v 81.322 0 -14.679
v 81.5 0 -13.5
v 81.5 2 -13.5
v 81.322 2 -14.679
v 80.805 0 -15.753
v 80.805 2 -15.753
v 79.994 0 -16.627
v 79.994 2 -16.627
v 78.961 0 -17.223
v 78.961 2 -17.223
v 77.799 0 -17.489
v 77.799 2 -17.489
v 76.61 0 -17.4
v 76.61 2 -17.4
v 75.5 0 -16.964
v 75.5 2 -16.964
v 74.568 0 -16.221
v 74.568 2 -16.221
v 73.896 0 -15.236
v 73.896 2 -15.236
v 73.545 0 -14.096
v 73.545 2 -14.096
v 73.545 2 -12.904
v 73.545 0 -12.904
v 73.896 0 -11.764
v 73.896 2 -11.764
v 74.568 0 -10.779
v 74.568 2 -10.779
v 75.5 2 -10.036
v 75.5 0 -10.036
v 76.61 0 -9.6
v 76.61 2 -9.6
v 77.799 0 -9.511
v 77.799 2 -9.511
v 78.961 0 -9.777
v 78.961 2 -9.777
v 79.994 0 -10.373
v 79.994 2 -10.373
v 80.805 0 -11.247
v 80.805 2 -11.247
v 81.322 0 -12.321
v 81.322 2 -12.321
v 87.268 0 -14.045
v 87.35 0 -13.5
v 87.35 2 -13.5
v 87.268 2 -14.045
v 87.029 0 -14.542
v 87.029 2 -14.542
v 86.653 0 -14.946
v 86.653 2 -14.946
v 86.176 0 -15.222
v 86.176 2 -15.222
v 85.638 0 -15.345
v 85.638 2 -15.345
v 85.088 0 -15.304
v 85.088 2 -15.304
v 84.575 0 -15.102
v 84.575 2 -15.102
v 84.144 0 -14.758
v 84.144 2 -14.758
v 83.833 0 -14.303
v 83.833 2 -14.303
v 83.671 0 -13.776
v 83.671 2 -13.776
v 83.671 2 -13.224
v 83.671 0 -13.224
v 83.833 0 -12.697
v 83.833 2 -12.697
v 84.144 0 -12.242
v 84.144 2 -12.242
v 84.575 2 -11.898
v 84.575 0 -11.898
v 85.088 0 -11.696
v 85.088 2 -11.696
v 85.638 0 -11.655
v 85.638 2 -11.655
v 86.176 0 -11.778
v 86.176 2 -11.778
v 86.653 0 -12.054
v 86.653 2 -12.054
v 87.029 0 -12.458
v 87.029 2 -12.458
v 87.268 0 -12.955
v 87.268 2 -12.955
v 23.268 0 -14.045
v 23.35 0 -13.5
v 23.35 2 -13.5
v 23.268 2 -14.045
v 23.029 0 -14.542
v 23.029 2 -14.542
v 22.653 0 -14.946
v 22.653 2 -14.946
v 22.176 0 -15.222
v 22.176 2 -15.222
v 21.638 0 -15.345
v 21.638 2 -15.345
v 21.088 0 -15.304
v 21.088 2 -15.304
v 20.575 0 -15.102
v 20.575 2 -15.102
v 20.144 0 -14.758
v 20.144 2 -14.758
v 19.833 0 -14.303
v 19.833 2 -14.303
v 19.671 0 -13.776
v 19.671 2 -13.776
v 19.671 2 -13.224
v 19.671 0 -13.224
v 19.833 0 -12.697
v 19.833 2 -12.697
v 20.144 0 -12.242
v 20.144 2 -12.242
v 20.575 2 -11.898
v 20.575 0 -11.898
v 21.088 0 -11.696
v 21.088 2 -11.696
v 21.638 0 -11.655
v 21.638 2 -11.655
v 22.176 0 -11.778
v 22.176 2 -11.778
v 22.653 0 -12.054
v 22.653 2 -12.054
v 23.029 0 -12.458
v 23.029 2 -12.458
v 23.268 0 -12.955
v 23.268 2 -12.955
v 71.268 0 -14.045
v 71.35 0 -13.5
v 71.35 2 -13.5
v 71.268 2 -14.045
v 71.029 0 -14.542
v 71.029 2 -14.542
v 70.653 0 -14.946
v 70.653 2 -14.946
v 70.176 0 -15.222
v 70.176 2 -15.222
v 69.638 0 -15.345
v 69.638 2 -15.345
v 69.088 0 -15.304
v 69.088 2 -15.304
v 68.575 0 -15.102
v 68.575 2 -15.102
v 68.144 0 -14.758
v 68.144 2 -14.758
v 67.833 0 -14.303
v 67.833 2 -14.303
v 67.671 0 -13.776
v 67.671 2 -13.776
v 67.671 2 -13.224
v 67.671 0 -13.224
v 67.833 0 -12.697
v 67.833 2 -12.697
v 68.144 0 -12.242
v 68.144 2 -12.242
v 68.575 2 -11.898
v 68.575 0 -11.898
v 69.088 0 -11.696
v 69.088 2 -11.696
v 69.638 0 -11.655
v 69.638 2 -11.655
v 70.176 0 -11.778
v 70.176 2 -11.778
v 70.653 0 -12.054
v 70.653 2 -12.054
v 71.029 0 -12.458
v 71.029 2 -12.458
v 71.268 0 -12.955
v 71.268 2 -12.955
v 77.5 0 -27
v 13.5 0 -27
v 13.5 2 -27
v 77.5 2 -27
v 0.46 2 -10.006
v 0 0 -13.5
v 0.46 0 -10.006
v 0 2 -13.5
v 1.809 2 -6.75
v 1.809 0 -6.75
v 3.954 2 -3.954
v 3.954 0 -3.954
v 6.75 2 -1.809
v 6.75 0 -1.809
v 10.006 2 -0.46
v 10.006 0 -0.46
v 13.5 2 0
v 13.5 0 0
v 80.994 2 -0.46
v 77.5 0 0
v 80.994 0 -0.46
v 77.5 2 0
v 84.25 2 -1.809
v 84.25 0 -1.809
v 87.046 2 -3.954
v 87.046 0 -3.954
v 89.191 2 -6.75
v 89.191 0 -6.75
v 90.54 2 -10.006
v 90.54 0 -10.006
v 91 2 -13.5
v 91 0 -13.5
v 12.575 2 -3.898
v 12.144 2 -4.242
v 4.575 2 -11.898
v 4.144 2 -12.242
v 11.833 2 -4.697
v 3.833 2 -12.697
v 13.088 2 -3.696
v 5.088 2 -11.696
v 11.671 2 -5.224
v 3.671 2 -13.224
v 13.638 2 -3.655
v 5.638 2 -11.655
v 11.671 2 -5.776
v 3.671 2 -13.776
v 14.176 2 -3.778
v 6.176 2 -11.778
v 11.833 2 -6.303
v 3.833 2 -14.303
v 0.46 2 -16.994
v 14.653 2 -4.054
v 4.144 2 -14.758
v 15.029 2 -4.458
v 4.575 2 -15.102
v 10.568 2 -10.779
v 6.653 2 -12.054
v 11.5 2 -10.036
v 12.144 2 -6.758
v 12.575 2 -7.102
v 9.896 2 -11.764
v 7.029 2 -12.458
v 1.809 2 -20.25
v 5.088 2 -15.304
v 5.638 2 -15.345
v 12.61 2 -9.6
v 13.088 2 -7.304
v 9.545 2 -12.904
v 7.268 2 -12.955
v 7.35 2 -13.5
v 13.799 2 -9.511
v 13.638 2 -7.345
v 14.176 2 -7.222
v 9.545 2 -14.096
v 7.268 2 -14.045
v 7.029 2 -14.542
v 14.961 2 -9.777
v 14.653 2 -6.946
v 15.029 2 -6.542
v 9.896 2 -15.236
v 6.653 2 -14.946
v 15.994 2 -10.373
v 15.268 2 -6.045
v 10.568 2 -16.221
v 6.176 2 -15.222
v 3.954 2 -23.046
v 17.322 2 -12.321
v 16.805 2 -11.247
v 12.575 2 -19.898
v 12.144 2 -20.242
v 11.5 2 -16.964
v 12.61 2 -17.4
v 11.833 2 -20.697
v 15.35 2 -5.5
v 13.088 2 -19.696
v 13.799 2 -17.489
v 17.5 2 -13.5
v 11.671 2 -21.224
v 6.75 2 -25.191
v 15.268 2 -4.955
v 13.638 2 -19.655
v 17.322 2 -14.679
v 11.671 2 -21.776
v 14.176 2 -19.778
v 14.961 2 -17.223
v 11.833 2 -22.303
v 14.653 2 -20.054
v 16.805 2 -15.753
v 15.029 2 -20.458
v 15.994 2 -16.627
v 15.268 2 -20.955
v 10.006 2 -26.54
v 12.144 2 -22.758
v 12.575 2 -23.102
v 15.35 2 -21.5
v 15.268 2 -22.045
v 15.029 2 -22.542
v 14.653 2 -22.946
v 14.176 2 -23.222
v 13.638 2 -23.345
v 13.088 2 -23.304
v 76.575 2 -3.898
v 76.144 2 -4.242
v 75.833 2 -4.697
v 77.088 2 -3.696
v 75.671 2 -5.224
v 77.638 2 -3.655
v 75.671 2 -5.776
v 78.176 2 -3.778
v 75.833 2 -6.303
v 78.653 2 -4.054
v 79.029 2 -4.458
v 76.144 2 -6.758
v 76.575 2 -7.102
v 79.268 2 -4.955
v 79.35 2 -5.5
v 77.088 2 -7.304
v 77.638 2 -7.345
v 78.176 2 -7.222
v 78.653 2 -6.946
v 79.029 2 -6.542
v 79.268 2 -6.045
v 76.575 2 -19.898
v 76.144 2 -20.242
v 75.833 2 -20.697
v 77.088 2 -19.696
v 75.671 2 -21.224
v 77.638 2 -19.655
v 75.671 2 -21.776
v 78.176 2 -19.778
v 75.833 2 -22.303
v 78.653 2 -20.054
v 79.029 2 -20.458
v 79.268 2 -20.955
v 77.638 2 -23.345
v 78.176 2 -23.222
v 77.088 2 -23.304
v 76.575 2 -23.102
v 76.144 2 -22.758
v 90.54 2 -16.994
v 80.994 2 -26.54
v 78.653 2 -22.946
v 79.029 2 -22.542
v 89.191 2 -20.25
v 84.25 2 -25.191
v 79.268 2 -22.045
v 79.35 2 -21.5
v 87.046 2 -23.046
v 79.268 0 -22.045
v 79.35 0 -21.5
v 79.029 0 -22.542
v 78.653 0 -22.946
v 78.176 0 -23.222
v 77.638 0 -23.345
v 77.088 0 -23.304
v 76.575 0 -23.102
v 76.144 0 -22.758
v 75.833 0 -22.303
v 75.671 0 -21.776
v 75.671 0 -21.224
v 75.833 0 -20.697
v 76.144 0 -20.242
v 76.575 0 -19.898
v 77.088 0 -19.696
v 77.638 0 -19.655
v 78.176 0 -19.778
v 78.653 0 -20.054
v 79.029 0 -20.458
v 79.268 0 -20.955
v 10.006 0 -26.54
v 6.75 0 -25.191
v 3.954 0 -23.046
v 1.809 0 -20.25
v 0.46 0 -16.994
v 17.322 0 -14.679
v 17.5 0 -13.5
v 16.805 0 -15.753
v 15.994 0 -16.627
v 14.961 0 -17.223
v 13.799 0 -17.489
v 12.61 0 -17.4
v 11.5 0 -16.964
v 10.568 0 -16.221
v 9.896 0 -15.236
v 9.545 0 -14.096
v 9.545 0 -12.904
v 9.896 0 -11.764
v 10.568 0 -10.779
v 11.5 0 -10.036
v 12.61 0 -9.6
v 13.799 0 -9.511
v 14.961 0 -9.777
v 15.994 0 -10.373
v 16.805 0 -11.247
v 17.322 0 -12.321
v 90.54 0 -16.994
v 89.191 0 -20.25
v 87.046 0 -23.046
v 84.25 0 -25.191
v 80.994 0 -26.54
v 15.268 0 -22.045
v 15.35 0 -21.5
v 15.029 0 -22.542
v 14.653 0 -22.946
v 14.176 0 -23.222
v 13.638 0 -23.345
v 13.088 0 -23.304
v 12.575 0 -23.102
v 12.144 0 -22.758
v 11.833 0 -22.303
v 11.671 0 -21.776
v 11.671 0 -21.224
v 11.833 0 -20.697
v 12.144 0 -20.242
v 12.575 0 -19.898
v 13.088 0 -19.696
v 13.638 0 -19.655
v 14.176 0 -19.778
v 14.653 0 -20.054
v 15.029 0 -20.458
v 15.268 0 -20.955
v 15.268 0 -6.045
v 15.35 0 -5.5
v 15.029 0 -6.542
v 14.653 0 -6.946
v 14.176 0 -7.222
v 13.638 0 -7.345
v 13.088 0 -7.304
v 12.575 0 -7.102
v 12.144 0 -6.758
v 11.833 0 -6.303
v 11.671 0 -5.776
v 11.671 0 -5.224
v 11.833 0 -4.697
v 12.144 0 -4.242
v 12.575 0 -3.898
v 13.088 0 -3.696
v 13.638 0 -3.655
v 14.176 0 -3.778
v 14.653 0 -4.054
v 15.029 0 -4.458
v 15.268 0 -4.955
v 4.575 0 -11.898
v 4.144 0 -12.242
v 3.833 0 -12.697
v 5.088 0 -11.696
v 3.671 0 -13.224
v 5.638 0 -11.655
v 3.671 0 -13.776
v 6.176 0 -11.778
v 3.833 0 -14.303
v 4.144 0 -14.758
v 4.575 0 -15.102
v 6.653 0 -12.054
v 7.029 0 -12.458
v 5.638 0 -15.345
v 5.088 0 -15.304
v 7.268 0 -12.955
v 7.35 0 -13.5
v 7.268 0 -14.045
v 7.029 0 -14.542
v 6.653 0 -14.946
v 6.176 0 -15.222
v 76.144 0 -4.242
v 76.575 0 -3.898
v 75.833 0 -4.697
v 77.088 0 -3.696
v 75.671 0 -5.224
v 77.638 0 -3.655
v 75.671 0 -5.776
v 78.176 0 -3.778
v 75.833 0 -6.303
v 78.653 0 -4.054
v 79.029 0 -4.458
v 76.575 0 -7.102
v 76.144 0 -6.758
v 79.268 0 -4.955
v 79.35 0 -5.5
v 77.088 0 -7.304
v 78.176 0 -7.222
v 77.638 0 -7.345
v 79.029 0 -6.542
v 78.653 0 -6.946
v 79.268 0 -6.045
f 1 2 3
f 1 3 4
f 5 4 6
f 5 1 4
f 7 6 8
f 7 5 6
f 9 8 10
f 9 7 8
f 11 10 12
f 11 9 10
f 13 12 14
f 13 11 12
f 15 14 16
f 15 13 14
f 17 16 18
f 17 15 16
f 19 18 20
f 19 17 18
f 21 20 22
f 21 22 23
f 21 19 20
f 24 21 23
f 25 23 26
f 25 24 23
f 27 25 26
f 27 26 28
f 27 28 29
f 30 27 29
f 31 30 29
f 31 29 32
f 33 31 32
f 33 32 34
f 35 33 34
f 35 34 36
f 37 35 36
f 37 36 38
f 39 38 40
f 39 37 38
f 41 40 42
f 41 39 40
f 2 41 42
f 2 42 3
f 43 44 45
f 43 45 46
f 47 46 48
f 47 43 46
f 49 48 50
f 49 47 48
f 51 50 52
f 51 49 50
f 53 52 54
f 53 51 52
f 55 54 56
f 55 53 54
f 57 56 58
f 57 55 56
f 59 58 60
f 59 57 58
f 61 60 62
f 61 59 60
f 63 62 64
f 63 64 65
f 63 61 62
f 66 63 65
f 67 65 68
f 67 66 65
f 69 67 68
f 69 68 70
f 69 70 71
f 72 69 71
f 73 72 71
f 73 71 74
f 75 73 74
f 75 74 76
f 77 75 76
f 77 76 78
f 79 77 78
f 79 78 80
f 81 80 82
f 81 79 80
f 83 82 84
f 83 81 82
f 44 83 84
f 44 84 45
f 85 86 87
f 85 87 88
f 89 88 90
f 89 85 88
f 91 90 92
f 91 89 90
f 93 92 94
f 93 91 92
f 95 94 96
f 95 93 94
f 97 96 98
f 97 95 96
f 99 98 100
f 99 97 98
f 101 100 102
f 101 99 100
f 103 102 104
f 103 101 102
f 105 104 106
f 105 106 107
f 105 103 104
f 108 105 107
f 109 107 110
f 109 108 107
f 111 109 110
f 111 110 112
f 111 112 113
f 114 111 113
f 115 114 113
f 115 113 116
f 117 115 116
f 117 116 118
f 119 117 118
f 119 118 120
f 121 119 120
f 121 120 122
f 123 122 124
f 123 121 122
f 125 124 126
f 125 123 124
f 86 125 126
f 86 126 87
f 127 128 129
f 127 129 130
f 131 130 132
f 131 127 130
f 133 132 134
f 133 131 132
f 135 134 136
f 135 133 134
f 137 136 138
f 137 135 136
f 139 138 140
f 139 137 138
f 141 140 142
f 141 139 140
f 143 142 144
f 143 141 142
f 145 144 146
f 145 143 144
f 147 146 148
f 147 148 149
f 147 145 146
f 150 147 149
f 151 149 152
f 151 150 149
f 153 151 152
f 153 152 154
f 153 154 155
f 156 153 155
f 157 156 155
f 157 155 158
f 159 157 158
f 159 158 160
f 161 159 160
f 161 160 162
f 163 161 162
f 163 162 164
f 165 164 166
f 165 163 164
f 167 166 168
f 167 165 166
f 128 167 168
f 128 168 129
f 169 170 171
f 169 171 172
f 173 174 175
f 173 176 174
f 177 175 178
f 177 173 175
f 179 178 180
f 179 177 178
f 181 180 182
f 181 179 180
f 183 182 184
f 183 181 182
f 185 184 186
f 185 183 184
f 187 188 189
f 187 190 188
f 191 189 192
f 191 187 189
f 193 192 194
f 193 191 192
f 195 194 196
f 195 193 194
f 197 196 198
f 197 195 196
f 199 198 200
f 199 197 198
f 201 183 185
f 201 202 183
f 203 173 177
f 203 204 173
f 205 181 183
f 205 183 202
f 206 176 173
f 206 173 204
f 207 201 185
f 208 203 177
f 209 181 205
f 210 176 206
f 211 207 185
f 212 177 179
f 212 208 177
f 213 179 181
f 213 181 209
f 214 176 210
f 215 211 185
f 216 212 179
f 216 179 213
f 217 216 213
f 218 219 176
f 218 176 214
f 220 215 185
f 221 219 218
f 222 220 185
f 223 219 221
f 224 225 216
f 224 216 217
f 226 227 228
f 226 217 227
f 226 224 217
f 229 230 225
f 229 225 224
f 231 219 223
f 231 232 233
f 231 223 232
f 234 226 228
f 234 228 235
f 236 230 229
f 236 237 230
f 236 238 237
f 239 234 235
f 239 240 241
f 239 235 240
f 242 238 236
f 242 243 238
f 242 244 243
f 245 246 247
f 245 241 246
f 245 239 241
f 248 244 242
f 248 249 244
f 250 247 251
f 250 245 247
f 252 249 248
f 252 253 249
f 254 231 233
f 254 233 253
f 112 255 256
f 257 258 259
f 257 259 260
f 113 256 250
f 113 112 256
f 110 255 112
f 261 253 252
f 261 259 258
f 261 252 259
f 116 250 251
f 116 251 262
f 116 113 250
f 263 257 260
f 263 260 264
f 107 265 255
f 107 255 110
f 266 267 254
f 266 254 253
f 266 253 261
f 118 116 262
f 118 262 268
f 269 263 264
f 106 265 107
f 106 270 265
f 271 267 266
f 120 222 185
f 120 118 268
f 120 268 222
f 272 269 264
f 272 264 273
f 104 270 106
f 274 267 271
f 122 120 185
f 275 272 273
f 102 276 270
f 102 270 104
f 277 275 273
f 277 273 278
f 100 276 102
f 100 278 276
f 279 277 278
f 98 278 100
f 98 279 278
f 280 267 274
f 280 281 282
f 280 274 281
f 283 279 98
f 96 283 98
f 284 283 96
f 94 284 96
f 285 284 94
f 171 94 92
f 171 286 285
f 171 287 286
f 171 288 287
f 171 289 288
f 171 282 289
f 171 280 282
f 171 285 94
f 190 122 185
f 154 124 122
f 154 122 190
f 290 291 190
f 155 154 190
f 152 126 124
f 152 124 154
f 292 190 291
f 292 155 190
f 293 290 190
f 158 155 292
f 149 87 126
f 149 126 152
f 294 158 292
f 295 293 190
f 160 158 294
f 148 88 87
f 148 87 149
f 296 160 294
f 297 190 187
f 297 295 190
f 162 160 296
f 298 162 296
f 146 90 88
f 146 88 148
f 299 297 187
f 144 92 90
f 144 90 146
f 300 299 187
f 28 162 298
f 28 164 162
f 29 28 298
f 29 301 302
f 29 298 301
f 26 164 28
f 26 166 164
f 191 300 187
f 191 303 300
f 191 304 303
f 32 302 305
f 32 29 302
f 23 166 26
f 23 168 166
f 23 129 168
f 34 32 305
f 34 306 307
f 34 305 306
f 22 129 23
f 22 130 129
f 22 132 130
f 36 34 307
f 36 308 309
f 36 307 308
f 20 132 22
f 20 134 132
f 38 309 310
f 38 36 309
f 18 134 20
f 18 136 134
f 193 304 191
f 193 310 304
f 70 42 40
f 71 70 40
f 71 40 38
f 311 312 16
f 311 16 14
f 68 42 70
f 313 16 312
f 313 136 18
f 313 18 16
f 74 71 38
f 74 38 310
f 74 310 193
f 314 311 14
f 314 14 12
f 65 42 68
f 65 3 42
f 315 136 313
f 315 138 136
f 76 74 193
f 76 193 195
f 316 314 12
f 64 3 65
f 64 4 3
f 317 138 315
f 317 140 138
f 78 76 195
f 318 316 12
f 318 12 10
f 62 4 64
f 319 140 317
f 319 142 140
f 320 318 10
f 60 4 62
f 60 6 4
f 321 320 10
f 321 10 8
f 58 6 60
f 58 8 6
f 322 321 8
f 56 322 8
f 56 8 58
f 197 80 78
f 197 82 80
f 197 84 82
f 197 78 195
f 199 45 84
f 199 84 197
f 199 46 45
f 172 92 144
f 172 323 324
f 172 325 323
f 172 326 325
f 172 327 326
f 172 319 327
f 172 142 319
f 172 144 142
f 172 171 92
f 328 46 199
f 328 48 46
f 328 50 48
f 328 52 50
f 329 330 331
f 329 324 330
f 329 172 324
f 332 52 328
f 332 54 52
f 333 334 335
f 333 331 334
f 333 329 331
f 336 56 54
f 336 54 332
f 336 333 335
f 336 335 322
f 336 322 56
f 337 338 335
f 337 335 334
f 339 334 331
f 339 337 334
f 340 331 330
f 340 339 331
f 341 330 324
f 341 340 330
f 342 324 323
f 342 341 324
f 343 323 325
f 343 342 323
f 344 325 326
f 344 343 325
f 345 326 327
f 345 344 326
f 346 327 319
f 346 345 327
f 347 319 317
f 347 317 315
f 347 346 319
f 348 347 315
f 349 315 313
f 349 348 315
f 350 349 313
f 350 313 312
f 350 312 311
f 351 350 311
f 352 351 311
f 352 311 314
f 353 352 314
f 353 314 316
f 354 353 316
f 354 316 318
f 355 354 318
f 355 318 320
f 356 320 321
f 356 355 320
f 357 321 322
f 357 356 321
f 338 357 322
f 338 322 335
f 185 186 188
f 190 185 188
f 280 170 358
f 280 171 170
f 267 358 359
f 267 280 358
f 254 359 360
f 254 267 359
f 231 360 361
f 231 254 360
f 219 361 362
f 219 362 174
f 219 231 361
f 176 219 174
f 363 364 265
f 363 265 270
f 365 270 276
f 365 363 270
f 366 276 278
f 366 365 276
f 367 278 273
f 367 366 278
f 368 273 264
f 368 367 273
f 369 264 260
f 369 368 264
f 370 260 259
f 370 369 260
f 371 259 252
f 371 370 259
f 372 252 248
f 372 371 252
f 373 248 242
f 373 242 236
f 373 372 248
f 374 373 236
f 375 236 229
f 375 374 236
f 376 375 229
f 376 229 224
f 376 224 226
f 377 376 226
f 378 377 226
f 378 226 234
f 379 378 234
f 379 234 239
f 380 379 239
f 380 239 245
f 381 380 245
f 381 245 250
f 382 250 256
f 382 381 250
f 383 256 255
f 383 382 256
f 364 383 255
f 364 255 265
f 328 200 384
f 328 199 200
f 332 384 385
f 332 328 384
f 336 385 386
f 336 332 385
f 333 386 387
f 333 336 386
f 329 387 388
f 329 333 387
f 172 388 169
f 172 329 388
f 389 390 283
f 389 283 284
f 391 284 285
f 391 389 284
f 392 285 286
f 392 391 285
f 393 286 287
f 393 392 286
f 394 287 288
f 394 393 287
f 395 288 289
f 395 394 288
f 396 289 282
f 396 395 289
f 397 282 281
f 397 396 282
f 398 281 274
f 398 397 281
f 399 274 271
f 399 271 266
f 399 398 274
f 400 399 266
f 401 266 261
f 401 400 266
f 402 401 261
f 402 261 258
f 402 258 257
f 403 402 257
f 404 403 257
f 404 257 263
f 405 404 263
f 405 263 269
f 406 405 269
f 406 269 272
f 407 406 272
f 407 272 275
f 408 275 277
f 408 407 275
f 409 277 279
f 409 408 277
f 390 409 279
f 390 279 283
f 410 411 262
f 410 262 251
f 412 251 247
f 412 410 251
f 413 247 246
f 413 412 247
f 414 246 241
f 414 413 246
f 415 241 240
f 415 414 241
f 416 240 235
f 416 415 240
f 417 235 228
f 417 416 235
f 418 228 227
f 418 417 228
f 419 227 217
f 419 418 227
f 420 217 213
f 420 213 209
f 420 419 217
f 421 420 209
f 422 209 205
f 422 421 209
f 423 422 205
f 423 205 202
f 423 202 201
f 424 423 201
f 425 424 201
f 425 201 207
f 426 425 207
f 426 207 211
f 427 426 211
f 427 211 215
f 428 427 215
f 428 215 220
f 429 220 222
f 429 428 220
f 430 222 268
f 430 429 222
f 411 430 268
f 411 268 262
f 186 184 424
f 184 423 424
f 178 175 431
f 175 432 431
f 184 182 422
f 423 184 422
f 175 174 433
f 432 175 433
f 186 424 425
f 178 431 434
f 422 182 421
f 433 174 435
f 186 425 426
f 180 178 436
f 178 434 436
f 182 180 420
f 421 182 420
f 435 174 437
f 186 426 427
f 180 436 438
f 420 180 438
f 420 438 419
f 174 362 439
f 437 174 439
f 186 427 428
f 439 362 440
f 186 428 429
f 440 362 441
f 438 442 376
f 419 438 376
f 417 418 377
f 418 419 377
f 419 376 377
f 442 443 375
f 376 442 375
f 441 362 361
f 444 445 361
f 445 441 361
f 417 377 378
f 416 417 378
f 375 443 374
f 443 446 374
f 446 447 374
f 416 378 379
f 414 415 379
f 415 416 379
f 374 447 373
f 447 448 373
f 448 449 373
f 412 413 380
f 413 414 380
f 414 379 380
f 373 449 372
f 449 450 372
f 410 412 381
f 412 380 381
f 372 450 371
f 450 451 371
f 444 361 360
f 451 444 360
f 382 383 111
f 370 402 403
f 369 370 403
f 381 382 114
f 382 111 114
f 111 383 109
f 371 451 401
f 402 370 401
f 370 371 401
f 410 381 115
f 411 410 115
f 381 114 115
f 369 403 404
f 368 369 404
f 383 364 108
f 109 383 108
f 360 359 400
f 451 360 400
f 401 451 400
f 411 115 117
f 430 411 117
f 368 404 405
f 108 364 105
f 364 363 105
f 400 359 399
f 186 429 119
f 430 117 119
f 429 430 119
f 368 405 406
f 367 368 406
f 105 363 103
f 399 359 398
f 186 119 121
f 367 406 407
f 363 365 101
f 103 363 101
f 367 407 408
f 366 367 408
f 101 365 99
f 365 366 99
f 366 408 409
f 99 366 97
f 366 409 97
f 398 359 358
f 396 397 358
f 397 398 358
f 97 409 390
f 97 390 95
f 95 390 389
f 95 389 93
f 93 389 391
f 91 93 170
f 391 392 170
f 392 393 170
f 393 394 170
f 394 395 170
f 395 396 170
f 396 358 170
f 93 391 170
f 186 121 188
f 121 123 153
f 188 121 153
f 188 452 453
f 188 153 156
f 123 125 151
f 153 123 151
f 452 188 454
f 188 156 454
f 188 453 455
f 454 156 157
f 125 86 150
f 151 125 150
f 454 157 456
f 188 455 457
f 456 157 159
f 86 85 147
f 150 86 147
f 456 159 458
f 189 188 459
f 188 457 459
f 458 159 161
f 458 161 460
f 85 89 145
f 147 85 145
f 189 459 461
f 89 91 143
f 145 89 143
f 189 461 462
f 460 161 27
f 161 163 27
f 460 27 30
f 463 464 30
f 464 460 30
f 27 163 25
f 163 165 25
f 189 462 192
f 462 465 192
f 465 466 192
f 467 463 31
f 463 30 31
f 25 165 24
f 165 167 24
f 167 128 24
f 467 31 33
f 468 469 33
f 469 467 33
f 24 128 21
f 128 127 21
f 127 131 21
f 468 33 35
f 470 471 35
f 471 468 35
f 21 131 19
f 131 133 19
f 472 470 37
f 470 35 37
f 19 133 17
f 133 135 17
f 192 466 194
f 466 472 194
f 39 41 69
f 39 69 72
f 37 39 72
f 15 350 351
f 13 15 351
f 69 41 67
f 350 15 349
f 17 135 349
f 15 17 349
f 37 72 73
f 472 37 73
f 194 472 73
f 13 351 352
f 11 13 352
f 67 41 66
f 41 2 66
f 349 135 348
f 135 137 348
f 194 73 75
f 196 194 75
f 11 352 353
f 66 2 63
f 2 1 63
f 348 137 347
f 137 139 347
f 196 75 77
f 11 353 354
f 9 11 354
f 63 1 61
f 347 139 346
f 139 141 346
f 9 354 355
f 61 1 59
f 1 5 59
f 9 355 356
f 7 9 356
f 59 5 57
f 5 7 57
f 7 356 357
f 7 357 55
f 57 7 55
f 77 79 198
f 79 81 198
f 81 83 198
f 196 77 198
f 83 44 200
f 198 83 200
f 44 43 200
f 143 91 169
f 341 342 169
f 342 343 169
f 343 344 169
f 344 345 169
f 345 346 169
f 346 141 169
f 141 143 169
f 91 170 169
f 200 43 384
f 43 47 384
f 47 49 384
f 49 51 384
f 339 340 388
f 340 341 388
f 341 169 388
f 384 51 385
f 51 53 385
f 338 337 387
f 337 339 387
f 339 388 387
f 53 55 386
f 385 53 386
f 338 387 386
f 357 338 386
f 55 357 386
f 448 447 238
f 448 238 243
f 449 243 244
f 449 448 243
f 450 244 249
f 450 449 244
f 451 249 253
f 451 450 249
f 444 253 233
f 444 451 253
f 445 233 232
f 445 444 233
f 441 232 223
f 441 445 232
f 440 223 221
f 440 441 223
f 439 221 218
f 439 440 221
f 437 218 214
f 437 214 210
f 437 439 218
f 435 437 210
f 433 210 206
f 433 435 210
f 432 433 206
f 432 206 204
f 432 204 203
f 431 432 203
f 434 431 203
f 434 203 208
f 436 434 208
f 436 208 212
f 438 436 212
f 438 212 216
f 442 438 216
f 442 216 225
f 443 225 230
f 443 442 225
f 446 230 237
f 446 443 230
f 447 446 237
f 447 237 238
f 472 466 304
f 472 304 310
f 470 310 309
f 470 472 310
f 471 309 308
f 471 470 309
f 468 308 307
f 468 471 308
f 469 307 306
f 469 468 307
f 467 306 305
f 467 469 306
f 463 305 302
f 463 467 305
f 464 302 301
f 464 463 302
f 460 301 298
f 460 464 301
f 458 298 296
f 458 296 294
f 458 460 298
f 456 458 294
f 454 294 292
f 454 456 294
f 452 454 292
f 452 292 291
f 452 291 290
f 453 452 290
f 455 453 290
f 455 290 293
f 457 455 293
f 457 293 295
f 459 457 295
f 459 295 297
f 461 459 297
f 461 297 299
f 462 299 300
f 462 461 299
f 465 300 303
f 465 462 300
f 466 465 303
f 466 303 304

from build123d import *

# Parameters (mm, degrees)
SKETCH1_W                = 91
SKETCH1_H                = 27
EXTRUDE1_DEPTH           = 2
CUT_EXTRUDE1_START       = -2
CUT_EXTRUDE1_OUTLINE_R   = 4
CUT_EXTRUDE1_OUTLINE_R_2 = 1.85
CUT_EXTRUDE1_DEPTH       = 2
FILLET1_R                = 13.5
FILLET2_R                = 13.5
FILLET3_R                = 13.5
FILLET4_R                = 13.5


# Read off the part's stored shape, not the designer's step: Cut-Extrude1
with BuildPart() as part:
    # Sketch1 → Extrude1 (new body)
    with BuildSketch(Plane(origin=(0, 0, 0), x_dir=(1, 0, 0), z_dir=(0, 1, 0))):
        with Locations((45.5, 13.5)):
            Rectangle(SKETCH1_W, SKETCH1_H)
    extrude(amount=EXTRUDE1_DEPTH)

    # Cut-Extrude1 outline → Cut-Extrude1 (cut)
    with BuildSketch(Plane(origin=(0, 2, 0), x_dir=(1, 0, 0), z_dir=(0, 1, 0)).offset(CUT_EXTRUDE1_START)):
        with Locations((13.5, 13.5)):
            Circle(CUT_EXTRUDE1_OUTLINE_R)
        with Locations((21.5, 13.5)):
            Circle(CUT_EXTRUDE1_OUTLINE_R_2)
        with Locations((5.5, 13.5)):
            Circle(CUT_EXTRUDE1_OUTLINE_R_2)
        with Locations((13.5, 5.5)):
            Circle(CUT_EXTRUDE1_OUTLINE_R_2)
        with Locations((13.5, 21.5)):
            Circle(CUT_EXTRUDE1_OUTLINE_R_2)
        with Locations((77.5, 13.5)):
            Circle(CUT_EXTRUDE1_OUTLINE_R)
        with Locations((85.5, 13.5)):
            Circle(CUT_EXTRUDE1_OUTLINE_R_2)
        with Locations((69.5, 13.5)):
            Circle(CUT_EXTRUDE1_OUTLINE_R_2)
        with Locations((77.5, 5.5)):
            Circle(CUT_EXTRUDE1_OUTLINE_R_2)
        with Locations((77.5, 21.5)):
            Circle(CUT_EXTRUDE1_OUTLINE_R_2)
    extrude(amount=CUT_EXTRUDE1_DEPTH, mode=Mode.SUBTRACT)

    # Fillet1
    fillet1_edges = [part.edges().sort_by_distance(p)[0] for p in [
        (91, 1, 0),
    ]]
    fillet(fillet1_edges, radius=FILLET1_R)

    # Fillet2
    fillet2_edges = [part.edges().sort_by_distance(p)[0] for p in [
        (91, 1, -27),
    ]]
    fillet(fillet2_edges, radius=FILLET2_R - 0.0001)  # a hair under: the kernel refuses the full size

    # Fillet3
    fillet3_edges = [part.edges().sort_by_distance(p)[0] for p in [
        (0, 1, -27),
    ]]
    fillet(fillet3_edges, radius=FILLET3_R)

    # Fillet4
    fillet4_edges = [part.edges().sort_by_distance(p)[0] for p in [
        (0, 1, 0),
    ]]
    fillet(fillet4_edges, radius=FILLET4_R - 0.0001)  # a hair under: the kernel refuses the full size


solid = part.part
